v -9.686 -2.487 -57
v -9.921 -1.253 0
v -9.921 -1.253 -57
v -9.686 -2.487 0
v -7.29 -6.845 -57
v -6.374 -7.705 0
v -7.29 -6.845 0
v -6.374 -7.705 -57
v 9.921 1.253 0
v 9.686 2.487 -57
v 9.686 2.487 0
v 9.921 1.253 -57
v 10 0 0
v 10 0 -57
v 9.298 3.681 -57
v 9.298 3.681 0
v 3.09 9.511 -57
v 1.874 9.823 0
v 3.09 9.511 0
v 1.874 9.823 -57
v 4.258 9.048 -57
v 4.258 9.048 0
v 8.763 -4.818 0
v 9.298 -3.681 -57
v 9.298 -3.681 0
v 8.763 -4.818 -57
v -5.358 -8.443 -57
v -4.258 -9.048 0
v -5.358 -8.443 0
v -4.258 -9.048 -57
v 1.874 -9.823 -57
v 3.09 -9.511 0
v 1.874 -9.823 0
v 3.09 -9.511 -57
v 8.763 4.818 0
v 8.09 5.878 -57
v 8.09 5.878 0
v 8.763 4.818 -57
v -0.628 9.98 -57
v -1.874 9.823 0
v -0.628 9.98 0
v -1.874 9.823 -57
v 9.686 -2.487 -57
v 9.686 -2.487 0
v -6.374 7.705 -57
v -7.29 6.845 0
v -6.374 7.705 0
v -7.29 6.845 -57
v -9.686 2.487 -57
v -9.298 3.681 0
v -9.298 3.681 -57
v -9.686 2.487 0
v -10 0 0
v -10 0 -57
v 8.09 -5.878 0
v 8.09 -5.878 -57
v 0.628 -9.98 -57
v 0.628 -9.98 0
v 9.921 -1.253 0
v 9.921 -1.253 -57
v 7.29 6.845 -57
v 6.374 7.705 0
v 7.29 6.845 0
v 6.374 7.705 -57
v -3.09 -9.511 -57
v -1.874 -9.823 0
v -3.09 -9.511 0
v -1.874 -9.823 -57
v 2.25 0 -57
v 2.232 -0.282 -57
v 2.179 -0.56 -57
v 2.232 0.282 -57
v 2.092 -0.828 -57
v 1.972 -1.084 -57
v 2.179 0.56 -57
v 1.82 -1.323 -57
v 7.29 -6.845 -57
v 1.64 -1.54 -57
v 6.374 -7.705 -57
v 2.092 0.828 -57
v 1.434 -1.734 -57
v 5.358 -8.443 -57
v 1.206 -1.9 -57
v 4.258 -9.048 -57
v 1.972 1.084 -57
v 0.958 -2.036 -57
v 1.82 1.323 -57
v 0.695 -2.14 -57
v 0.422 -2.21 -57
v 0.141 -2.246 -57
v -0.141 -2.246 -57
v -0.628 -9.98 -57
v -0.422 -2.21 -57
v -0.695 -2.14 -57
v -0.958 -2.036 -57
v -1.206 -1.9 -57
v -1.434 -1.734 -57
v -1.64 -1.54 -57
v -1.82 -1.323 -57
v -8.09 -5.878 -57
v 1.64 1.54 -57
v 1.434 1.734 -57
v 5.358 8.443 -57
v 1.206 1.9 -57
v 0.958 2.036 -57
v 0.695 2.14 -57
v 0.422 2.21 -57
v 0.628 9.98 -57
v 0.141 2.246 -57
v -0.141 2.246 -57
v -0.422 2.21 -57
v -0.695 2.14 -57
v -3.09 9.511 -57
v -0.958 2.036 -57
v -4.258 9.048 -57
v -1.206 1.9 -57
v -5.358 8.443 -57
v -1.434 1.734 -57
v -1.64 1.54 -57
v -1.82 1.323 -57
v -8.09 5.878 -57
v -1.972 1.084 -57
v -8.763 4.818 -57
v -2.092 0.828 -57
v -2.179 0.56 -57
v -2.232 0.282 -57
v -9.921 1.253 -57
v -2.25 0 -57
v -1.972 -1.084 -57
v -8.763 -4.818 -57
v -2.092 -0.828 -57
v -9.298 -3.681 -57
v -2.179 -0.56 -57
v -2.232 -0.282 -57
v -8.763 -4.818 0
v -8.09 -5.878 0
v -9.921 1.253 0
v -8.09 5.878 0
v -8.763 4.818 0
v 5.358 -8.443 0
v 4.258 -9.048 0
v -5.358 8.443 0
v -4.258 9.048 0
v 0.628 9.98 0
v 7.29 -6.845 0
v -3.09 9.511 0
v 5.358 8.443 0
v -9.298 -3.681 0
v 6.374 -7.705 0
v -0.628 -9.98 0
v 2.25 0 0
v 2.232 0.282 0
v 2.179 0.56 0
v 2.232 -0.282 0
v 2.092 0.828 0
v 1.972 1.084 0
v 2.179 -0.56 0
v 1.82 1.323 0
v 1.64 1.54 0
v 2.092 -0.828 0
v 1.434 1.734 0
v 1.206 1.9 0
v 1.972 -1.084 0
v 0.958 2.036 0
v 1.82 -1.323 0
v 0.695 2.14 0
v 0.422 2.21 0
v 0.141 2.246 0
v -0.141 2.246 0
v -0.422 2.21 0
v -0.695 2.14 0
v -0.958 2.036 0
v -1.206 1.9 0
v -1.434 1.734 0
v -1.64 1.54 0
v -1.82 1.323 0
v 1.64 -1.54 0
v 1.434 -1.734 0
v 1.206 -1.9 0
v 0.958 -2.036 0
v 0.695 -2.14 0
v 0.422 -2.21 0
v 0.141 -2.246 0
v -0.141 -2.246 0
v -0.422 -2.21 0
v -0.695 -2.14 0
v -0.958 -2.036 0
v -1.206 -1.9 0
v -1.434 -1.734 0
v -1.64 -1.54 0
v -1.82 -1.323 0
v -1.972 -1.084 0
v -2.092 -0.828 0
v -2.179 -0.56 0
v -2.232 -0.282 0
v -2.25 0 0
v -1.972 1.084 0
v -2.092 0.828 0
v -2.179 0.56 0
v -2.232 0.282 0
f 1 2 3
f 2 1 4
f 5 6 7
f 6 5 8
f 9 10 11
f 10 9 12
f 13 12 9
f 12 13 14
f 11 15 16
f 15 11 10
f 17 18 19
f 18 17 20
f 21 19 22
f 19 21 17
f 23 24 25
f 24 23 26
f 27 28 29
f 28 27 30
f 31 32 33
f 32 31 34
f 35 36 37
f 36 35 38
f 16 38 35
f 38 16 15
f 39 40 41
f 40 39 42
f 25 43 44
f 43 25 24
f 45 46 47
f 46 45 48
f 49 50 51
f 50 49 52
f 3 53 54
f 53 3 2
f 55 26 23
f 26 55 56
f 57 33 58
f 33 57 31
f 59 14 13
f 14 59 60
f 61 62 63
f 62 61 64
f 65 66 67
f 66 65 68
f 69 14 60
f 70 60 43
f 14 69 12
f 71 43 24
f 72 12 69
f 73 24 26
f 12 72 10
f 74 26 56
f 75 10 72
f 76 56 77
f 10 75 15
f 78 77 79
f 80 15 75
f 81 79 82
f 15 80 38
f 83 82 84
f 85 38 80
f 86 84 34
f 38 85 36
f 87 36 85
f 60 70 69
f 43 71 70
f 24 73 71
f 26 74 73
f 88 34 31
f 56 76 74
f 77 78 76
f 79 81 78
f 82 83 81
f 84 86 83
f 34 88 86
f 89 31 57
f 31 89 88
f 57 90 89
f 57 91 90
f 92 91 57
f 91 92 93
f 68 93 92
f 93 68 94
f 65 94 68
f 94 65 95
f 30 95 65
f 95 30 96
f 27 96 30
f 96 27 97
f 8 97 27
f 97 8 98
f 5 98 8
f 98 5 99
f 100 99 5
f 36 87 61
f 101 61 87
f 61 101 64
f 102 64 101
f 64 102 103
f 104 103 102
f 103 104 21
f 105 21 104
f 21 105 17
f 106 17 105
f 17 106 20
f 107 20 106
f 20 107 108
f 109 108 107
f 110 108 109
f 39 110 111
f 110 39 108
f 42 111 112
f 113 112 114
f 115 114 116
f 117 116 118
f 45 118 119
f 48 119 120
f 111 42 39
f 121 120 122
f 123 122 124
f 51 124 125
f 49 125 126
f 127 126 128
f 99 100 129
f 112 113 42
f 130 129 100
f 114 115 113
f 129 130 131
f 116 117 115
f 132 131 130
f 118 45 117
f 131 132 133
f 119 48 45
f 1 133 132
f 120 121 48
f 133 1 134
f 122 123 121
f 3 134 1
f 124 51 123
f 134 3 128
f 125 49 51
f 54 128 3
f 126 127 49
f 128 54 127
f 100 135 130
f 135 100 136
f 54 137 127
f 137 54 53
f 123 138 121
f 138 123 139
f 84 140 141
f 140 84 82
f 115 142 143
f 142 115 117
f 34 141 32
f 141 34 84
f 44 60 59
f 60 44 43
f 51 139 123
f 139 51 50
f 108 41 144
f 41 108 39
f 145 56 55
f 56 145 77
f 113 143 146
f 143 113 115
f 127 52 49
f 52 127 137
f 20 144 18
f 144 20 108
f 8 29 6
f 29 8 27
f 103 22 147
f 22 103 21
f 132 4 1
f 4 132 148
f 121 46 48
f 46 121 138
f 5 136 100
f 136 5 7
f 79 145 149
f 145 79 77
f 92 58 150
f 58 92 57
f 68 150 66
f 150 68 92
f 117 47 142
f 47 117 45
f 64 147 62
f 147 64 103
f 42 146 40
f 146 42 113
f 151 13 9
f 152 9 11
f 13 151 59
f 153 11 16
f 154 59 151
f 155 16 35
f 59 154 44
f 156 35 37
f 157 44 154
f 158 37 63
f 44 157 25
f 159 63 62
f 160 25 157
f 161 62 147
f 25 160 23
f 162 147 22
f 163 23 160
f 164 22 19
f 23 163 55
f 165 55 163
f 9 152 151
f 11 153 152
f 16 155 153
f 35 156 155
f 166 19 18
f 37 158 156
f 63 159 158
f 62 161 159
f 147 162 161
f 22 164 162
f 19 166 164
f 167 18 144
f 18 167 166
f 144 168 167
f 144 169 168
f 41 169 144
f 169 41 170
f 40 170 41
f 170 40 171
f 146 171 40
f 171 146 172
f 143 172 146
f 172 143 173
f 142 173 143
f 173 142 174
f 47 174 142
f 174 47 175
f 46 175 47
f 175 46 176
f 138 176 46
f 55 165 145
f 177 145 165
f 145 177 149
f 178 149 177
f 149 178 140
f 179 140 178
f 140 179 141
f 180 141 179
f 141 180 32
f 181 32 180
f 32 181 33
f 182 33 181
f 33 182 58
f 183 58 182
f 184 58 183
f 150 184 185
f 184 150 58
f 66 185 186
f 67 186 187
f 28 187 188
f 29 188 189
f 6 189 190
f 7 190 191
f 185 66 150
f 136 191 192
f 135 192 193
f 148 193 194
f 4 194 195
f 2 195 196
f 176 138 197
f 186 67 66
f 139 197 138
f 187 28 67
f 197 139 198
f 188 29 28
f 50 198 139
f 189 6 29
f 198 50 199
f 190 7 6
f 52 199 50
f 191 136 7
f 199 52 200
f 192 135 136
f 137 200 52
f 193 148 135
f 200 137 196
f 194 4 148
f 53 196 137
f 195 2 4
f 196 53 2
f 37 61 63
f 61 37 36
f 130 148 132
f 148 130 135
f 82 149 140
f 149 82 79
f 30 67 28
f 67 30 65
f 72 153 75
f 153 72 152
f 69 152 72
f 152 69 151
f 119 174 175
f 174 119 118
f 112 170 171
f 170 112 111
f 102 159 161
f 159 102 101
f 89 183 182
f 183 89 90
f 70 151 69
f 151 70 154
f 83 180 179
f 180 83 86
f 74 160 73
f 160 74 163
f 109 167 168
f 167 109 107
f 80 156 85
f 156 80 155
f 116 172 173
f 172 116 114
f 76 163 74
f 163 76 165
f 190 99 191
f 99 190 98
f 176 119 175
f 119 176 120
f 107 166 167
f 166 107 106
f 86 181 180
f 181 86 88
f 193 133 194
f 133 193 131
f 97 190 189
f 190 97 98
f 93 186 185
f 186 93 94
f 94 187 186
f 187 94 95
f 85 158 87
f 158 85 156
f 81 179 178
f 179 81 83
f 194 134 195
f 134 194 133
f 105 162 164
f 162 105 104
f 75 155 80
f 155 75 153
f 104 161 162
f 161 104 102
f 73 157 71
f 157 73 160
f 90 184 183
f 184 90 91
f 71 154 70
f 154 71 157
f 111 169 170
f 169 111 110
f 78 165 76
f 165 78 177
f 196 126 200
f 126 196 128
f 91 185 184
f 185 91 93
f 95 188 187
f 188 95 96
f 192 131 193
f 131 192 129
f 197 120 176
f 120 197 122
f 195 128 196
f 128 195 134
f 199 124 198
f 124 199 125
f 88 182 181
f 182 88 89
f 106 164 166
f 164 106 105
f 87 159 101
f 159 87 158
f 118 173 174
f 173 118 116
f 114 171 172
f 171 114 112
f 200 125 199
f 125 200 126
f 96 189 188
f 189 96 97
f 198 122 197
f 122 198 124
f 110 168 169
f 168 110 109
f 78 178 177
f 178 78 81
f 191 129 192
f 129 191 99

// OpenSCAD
$fn = 50;


difference() {
	union() {
		translate(v = [0, 0, -57.0000000000]) {
			cylinder(h = 57, r = 10.0000000000);
		}
		cylinder(h = 0, r = 16.0000000000);
	}
	union() {
		#translate(v = [0, 0, -57]) {
			cylinder(h = 57, r = 2.2500000000);
		}
	}
}
